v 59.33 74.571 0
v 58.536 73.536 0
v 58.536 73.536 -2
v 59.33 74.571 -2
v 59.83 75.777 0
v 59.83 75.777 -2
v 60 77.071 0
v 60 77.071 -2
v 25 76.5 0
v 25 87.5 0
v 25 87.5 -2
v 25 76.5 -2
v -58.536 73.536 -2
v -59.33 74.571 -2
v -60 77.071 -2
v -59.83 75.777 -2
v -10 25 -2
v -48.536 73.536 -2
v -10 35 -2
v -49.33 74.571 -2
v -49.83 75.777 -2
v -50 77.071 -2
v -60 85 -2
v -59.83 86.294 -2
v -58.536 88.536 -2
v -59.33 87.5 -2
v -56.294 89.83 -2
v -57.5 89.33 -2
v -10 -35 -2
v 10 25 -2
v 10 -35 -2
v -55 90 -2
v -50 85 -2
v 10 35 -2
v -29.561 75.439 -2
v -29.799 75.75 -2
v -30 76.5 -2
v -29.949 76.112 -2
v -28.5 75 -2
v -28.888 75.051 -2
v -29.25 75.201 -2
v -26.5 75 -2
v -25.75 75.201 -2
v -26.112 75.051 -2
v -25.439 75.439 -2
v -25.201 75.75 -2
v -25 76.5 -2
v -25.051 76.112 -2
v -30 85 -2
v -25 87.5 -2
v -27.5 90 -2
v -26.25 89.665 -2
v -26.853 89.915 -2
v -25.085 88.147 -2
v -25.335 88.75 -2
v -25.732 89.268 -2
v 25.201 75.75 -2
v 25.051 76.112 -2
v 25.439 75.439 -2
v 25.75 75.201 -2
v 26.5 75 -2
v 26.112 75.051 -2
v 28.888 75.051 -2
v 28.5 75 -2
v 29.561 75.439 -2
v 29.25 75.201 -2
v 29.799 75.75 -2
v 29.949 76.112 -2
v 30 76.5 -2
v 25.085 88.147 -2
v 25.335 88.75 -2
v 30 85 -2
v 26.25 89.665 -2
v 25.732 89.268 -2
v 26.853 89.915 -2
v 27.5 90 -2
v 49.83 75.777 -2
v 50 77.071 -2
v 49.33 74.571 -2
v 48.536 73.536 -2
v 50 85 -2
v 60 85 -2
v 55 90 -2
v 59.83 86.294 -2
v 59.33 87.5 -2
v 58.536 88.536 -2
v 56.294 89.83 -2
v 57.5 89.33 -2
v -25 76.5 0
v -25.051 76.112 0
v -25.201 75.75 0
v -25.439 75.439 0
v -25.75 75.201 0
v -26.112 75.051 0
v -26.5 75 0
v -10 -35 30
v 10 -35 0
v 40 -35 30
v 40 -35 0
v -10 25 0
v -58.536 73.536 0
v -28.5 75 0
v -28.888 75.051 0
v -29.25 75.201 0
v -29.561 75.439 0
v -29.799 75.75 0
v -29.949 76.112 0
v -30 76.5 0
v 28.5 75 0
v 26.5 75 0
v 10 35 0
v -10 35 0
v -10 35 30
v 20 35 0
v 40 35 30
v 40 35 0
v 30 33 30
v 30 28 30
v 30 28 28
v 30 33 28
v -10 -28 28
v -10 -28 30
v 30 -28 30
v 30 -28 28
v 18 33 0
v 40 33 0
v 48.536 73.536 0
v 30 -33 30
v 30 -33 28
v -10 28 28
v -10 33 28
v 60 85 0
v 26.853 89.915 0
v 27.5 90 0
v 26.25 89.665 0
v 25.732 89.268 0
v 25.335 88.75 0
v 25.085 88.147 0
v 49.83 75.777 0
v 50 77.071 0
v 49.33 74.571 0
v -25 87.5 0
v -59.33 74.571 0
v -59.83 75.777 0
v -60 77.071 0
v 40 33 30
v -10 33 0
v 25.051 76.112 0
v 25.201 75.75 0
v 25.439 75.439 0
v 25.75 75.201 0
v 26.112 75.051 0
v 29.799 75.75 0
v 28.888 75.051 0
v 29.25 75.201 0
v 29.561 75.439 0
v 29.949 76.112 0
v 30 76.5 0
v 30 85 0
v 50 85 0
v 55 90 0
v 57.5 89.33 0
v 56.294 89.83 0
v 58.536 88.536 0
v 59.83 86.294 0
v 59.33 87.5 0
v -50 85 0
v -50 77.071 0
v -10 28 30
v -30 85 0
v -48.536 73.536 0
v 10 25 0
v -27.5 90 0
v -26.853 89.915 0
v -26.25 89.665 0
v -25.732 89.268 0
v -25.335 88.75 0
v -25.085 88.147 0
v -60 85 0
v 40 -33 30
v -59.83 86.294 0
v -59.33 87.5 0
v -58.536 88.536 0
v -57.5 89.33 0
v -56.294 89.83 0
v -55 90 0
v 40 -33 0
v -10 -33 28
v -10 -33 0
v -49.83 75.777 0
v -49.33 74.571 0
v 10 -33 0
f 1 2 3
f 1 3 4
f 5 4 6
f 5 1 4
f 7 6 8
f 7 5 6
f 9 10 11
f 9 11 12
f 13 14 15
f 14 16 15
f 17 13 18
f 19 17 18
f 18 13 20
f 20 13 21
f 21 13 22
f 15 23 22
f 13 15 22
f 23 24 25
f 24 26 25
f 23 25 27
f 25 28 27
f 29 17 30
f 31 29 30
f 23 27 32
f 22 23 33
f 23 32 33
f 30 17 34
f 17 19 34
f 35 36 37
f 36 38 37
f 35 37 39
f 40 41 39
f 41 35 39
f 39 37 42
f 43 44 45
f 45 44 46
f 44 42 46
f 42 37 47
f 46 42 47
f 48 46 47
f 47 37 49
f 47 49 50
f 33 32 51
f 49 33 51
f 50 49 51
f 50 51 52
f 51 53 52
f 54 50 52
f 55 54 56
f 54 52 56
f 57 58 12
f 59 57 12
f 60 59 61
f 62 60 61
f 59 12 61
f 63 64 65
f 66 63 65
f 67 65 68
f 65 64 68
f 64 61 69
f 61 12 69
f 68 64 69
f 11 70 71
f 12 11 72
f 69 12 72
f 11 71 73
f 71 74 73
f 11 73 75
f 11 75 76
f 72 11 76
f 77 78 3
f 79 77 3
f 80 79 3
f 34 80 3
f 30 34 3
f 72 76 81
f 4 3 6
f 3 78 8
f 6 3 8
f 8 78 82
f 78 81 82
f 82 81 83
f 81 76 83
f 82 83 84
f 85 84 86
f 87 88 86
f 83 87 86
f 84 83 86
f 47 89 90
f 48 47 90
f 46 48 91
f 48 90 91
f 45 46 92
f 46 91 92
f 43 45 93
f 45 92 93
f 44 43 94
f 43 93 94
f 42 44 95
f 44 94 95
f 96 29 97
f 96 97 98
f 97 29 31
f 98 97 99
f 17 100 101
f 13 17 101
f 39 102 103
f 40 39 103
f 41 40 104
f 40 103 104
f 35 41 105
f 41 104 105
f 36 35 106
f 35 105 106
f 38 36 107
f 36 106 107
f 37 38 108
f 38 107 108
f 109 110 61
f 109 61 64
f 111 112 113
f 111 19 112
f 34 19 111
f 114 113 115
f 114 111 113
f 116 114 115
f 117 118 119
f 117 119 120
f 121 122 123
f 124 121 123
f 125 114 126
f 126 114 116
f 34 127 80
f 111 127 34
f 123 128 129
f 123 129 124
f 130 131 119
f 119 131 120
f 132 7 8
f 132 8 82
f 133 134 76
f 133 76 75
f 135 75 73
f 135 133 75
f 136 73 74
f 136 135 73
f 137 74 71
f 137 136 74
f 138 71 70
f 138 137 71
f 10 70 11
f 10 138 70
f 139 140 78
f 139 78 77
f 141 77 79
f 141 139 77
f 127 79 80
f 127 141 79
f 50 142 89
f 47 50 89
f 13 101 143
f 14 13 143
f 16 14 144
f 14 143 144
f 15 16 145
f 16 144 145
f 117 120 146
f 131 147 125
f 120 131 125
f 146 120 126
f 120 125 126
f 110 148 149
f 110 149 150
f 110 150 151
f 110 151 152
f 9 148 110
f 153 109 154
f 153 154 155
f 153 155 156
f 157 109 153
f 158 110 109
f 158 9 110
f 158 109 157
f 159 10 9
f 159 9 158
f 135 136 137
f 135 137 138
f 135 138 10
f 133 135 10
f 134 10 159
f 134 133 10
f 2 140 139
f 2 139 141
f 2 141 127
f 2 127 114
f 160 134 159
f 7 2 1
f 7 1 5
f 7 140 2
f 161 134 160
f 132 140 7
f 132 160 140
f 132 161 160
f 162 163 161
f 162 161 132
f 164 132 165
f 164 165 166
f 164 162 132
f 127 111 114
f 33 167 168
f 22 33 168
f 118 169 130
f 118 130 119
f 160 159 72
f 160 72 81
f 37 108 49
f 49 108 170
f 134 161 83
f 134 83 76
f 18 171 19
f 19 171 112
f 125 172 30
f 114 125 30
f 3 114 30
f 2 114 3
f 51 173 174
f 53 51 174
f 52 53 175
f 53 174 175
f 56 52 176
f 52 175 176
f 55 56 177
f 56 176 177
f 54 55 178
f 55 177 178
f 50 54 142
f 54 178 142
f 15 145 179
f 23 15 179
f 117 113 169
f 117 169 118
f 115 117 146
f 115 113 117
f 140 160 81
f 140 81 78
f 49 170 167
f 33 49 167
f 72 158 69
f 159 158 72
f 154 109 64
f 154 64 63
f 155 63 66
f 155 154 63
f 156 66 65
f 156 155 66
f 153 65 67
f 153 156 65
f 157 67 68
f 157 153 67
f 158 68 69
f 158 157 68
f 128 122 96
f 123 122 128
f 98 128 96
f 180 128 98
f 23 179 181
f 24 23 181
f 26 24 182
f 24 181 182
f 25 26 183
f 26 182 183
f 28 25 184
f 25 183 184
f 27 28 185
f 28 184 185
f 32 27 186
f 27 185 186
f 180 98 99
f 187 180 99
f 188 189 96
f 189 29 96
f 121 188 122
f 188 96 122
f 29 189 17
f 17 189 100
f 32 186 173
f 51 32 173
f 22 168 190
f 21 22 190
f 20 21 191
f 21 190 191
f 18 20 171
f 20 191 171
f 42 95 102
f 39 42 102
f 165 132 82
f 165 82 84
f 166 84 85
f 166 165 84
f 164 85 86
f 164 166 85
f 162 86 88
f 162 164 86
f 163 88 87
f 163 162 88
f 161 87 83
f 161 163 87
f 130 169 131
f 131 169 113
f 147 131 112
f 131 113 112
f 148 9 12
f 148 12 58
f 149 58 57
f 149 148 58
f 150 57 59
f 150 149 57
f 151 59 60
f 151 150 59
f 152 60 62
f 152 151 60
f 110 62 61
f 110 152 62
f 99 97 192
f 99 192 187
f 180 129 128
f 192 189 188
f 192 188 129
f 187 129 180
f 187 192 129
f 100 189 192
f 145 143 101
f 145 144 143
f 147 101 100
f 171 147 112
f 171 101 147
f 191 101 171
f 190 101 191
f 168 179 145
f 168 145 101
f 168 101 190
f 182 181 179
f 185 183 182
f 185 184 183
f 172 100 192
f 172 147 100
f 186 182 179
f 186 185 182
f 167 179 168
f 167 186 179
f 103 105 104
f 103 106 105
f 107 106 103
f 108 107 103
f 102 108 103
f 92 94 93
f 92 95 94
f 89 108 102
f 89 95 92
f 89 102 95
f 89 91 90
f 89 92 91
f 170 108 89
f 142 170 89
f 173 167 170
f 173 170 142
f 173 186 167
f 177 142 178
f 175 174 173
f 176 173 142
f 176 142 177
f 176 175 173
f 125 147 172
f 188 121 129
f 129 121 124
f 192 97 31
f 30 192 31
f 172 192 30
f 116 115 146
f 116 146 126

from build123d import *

# Parameters (mm, degrees)
BOSS_EXTRUDE1_DEPTH   = 2
BOSS_EXTRUDE1_2_DEPTH = 2
BASE_W                = 20
BASE_H                = 70
BOSS_EXTRUDE2_DEPTH   = 2
SKETCH10_W            = 50
SKETCH10_H            = 30
BOSS_EXTRUDE3_DEPTH   = 2
SKETCH9_W             = 50
SKETCH9_H             = 30
BOSS_EXTRUDE4_DEPTH   = 2
SKETCH11_W            = 40
SKETCH11_H            = 5
BOSS_EXTRUDE5_DEPTH   = 2


with BuildPart() as part:
    # hook → Boss-Extrude1 (new body)
    with BuildSketch(Plane.XY):
        with BuildLine():
            Line((-10, 35), (-10, 25))
            Line((-10, 25), (-58.535533906, 73.535533906))
            ThreePointArc((-58.535533906, 73.535533906), (-59.619397663, 75.15765065), (-60, 77.071067812))
            Line((-60, 77.071067812), (-60, 85))
            ThreePointArc((-60, 85), (-58.535533906, 88.535533906), (-55, 90))
            Line((-55, 90), (-27.5, 90))
            ThreePointArc((-27.5, 90), (-25.732233047, 89.267766953), (-25, 87.5))
            Line((-25, 87.5), (-24.999999999, 76.499999999))
            ThreePointArc((-24.999999999, 76.499999999), (-25.439339828, 75.439339828), (-26.499999999, 74.999999999))
            Line((-26.499999999, 74.999999999), (-28.499999999, 74.999999999))
            ThreePointArc((-28.499999999, 74.999999999), (-29.560660171, 75.439339828), (-29.999999999, 76.499999999))
            Line((-29.999999999, 76.499999999), (-29.999999999, 84.999999999))
            Line((-29.999999999, 84.999999999), (-49.999999999, 84.999999999))
            Line((-49.999999999, 84.999999999), (-50, 77.071067812))
            ThreePointArc((-50, 77.071067812), (-49.619397663, 75.15765065), (-48.535533906, 73.535533906))
            Line((-48.535533906, 73.535533906), (-10, 35))
        make_face()
    extrude(amount=-BOSS_EXTRUDE1_DEPTH)



with BuildPart() as body_2:
    # hook → Boss-Extrude1 2 (new body)
    with BuildSketch(Plane.XY):
        with BuildLine():
            Line((48.535533906, 73.535533906), (10, 35))
            Line((10, 35), (10, 25))
            Line((10, 25), (58.535533906, 73.535533906))
            ThreePointArc((58.535533906, 73.535533906), (59.619397663, 75.15765065), (60, 77.071067812))
            Line((60, 77.071067812), (60, 85))
            ThreePointArc((60, 85), (58.535533906, 88.535533906), (55, 90))
            Line((55, 90), (27.5, 90))
            ThreePointArc((27.5, 90), (25.732233047, 89.267766953), (25, 87.5))
            Line((25, 87.5), (24.999999999, 76.499999999))
            ThreePointArc((24.999999999, 76.499999999), (25.439339828, 75.439339828), (26.499999999, 74.999999999))
            Line((26.499999999, 74.999999999), (28.499999999, 74.999999999))
            ThreePointArc((28.499999999, 74.999999999), (29.560660171, 75.439339828), (29.999999999, 76.499999999))
            Line((29.999999999, 76.499999999), (29.999999999, 84.999999999))
            Line((29.999999999, 84.999999999), (49.999999999, 84.999999999))
            Line((49.999999999, 84.999999999), (50, 77.071067812))
            ThreePointArc((50, 77.071067812), (49.619397663, 75.15765065), (48.535533906, 73.535533906))
        make_face()
    extrude(amount=-BOSS_EXTRUDE1_2_DEPTH)


with BuildPart() as part_1:
    add(part.part)

    add(body_2.part)  # Boss-Extrude2 merges body 2
    # base → Boss-Extrude2 (add)
    with BuildSketch(Plane.XY):
        Rectangle(BASE_W, BASE_H)
    extrude(amount=-BOSS_EXTRUDE2_DEPTH)

    # Sketch9 → Boss-Extrude4 (add)
    with BuildSketch(Plane(origin=(0, 35, 0), x_dir=(1, 0, 0), z_dir=(0, 1, 0))):
        with Locations((15, -15)):
            Rectangle(SKETCH9_W, SKETCH9_H)
    extrude(amount=-BOSS_EXTRUDE4_DEPTH)



with BuildPart() as body_2_2:
    # Sketch10 → Boss-Extrude3 (new body)
    with BuildSketch(Plane(origin=(0, -35, 0), x_dir=(1, 0, 0), z_dir=(0, 1, 0))):
        with Locations((15, -15)):
            Rectangle(SKETCH10_W, SKETCH10_H)
    extrude(amount=BOSS_EXTRUDE3_DEPTH)


with BuildPart() as part_2:
    add(part_1.part)

    add(body_2_2.part)  # Boss-Extrude5 merges body 2 2
    # Sketch11 → Boss-Extrude5 (add)
    with BuildSketch(Plane.XY.offset(30)):
        with Locations((10, -30.5)):
            Rectangle(SKETCH11_W, SKETCH11_H)
        with Locations((10, 30.5)):
            Rectangle(SKETCH11_W, SKETCH11_H)
    extrude(amount=-BOSS_EXTRUDE5_DEPTH)


solid = part_2.part
